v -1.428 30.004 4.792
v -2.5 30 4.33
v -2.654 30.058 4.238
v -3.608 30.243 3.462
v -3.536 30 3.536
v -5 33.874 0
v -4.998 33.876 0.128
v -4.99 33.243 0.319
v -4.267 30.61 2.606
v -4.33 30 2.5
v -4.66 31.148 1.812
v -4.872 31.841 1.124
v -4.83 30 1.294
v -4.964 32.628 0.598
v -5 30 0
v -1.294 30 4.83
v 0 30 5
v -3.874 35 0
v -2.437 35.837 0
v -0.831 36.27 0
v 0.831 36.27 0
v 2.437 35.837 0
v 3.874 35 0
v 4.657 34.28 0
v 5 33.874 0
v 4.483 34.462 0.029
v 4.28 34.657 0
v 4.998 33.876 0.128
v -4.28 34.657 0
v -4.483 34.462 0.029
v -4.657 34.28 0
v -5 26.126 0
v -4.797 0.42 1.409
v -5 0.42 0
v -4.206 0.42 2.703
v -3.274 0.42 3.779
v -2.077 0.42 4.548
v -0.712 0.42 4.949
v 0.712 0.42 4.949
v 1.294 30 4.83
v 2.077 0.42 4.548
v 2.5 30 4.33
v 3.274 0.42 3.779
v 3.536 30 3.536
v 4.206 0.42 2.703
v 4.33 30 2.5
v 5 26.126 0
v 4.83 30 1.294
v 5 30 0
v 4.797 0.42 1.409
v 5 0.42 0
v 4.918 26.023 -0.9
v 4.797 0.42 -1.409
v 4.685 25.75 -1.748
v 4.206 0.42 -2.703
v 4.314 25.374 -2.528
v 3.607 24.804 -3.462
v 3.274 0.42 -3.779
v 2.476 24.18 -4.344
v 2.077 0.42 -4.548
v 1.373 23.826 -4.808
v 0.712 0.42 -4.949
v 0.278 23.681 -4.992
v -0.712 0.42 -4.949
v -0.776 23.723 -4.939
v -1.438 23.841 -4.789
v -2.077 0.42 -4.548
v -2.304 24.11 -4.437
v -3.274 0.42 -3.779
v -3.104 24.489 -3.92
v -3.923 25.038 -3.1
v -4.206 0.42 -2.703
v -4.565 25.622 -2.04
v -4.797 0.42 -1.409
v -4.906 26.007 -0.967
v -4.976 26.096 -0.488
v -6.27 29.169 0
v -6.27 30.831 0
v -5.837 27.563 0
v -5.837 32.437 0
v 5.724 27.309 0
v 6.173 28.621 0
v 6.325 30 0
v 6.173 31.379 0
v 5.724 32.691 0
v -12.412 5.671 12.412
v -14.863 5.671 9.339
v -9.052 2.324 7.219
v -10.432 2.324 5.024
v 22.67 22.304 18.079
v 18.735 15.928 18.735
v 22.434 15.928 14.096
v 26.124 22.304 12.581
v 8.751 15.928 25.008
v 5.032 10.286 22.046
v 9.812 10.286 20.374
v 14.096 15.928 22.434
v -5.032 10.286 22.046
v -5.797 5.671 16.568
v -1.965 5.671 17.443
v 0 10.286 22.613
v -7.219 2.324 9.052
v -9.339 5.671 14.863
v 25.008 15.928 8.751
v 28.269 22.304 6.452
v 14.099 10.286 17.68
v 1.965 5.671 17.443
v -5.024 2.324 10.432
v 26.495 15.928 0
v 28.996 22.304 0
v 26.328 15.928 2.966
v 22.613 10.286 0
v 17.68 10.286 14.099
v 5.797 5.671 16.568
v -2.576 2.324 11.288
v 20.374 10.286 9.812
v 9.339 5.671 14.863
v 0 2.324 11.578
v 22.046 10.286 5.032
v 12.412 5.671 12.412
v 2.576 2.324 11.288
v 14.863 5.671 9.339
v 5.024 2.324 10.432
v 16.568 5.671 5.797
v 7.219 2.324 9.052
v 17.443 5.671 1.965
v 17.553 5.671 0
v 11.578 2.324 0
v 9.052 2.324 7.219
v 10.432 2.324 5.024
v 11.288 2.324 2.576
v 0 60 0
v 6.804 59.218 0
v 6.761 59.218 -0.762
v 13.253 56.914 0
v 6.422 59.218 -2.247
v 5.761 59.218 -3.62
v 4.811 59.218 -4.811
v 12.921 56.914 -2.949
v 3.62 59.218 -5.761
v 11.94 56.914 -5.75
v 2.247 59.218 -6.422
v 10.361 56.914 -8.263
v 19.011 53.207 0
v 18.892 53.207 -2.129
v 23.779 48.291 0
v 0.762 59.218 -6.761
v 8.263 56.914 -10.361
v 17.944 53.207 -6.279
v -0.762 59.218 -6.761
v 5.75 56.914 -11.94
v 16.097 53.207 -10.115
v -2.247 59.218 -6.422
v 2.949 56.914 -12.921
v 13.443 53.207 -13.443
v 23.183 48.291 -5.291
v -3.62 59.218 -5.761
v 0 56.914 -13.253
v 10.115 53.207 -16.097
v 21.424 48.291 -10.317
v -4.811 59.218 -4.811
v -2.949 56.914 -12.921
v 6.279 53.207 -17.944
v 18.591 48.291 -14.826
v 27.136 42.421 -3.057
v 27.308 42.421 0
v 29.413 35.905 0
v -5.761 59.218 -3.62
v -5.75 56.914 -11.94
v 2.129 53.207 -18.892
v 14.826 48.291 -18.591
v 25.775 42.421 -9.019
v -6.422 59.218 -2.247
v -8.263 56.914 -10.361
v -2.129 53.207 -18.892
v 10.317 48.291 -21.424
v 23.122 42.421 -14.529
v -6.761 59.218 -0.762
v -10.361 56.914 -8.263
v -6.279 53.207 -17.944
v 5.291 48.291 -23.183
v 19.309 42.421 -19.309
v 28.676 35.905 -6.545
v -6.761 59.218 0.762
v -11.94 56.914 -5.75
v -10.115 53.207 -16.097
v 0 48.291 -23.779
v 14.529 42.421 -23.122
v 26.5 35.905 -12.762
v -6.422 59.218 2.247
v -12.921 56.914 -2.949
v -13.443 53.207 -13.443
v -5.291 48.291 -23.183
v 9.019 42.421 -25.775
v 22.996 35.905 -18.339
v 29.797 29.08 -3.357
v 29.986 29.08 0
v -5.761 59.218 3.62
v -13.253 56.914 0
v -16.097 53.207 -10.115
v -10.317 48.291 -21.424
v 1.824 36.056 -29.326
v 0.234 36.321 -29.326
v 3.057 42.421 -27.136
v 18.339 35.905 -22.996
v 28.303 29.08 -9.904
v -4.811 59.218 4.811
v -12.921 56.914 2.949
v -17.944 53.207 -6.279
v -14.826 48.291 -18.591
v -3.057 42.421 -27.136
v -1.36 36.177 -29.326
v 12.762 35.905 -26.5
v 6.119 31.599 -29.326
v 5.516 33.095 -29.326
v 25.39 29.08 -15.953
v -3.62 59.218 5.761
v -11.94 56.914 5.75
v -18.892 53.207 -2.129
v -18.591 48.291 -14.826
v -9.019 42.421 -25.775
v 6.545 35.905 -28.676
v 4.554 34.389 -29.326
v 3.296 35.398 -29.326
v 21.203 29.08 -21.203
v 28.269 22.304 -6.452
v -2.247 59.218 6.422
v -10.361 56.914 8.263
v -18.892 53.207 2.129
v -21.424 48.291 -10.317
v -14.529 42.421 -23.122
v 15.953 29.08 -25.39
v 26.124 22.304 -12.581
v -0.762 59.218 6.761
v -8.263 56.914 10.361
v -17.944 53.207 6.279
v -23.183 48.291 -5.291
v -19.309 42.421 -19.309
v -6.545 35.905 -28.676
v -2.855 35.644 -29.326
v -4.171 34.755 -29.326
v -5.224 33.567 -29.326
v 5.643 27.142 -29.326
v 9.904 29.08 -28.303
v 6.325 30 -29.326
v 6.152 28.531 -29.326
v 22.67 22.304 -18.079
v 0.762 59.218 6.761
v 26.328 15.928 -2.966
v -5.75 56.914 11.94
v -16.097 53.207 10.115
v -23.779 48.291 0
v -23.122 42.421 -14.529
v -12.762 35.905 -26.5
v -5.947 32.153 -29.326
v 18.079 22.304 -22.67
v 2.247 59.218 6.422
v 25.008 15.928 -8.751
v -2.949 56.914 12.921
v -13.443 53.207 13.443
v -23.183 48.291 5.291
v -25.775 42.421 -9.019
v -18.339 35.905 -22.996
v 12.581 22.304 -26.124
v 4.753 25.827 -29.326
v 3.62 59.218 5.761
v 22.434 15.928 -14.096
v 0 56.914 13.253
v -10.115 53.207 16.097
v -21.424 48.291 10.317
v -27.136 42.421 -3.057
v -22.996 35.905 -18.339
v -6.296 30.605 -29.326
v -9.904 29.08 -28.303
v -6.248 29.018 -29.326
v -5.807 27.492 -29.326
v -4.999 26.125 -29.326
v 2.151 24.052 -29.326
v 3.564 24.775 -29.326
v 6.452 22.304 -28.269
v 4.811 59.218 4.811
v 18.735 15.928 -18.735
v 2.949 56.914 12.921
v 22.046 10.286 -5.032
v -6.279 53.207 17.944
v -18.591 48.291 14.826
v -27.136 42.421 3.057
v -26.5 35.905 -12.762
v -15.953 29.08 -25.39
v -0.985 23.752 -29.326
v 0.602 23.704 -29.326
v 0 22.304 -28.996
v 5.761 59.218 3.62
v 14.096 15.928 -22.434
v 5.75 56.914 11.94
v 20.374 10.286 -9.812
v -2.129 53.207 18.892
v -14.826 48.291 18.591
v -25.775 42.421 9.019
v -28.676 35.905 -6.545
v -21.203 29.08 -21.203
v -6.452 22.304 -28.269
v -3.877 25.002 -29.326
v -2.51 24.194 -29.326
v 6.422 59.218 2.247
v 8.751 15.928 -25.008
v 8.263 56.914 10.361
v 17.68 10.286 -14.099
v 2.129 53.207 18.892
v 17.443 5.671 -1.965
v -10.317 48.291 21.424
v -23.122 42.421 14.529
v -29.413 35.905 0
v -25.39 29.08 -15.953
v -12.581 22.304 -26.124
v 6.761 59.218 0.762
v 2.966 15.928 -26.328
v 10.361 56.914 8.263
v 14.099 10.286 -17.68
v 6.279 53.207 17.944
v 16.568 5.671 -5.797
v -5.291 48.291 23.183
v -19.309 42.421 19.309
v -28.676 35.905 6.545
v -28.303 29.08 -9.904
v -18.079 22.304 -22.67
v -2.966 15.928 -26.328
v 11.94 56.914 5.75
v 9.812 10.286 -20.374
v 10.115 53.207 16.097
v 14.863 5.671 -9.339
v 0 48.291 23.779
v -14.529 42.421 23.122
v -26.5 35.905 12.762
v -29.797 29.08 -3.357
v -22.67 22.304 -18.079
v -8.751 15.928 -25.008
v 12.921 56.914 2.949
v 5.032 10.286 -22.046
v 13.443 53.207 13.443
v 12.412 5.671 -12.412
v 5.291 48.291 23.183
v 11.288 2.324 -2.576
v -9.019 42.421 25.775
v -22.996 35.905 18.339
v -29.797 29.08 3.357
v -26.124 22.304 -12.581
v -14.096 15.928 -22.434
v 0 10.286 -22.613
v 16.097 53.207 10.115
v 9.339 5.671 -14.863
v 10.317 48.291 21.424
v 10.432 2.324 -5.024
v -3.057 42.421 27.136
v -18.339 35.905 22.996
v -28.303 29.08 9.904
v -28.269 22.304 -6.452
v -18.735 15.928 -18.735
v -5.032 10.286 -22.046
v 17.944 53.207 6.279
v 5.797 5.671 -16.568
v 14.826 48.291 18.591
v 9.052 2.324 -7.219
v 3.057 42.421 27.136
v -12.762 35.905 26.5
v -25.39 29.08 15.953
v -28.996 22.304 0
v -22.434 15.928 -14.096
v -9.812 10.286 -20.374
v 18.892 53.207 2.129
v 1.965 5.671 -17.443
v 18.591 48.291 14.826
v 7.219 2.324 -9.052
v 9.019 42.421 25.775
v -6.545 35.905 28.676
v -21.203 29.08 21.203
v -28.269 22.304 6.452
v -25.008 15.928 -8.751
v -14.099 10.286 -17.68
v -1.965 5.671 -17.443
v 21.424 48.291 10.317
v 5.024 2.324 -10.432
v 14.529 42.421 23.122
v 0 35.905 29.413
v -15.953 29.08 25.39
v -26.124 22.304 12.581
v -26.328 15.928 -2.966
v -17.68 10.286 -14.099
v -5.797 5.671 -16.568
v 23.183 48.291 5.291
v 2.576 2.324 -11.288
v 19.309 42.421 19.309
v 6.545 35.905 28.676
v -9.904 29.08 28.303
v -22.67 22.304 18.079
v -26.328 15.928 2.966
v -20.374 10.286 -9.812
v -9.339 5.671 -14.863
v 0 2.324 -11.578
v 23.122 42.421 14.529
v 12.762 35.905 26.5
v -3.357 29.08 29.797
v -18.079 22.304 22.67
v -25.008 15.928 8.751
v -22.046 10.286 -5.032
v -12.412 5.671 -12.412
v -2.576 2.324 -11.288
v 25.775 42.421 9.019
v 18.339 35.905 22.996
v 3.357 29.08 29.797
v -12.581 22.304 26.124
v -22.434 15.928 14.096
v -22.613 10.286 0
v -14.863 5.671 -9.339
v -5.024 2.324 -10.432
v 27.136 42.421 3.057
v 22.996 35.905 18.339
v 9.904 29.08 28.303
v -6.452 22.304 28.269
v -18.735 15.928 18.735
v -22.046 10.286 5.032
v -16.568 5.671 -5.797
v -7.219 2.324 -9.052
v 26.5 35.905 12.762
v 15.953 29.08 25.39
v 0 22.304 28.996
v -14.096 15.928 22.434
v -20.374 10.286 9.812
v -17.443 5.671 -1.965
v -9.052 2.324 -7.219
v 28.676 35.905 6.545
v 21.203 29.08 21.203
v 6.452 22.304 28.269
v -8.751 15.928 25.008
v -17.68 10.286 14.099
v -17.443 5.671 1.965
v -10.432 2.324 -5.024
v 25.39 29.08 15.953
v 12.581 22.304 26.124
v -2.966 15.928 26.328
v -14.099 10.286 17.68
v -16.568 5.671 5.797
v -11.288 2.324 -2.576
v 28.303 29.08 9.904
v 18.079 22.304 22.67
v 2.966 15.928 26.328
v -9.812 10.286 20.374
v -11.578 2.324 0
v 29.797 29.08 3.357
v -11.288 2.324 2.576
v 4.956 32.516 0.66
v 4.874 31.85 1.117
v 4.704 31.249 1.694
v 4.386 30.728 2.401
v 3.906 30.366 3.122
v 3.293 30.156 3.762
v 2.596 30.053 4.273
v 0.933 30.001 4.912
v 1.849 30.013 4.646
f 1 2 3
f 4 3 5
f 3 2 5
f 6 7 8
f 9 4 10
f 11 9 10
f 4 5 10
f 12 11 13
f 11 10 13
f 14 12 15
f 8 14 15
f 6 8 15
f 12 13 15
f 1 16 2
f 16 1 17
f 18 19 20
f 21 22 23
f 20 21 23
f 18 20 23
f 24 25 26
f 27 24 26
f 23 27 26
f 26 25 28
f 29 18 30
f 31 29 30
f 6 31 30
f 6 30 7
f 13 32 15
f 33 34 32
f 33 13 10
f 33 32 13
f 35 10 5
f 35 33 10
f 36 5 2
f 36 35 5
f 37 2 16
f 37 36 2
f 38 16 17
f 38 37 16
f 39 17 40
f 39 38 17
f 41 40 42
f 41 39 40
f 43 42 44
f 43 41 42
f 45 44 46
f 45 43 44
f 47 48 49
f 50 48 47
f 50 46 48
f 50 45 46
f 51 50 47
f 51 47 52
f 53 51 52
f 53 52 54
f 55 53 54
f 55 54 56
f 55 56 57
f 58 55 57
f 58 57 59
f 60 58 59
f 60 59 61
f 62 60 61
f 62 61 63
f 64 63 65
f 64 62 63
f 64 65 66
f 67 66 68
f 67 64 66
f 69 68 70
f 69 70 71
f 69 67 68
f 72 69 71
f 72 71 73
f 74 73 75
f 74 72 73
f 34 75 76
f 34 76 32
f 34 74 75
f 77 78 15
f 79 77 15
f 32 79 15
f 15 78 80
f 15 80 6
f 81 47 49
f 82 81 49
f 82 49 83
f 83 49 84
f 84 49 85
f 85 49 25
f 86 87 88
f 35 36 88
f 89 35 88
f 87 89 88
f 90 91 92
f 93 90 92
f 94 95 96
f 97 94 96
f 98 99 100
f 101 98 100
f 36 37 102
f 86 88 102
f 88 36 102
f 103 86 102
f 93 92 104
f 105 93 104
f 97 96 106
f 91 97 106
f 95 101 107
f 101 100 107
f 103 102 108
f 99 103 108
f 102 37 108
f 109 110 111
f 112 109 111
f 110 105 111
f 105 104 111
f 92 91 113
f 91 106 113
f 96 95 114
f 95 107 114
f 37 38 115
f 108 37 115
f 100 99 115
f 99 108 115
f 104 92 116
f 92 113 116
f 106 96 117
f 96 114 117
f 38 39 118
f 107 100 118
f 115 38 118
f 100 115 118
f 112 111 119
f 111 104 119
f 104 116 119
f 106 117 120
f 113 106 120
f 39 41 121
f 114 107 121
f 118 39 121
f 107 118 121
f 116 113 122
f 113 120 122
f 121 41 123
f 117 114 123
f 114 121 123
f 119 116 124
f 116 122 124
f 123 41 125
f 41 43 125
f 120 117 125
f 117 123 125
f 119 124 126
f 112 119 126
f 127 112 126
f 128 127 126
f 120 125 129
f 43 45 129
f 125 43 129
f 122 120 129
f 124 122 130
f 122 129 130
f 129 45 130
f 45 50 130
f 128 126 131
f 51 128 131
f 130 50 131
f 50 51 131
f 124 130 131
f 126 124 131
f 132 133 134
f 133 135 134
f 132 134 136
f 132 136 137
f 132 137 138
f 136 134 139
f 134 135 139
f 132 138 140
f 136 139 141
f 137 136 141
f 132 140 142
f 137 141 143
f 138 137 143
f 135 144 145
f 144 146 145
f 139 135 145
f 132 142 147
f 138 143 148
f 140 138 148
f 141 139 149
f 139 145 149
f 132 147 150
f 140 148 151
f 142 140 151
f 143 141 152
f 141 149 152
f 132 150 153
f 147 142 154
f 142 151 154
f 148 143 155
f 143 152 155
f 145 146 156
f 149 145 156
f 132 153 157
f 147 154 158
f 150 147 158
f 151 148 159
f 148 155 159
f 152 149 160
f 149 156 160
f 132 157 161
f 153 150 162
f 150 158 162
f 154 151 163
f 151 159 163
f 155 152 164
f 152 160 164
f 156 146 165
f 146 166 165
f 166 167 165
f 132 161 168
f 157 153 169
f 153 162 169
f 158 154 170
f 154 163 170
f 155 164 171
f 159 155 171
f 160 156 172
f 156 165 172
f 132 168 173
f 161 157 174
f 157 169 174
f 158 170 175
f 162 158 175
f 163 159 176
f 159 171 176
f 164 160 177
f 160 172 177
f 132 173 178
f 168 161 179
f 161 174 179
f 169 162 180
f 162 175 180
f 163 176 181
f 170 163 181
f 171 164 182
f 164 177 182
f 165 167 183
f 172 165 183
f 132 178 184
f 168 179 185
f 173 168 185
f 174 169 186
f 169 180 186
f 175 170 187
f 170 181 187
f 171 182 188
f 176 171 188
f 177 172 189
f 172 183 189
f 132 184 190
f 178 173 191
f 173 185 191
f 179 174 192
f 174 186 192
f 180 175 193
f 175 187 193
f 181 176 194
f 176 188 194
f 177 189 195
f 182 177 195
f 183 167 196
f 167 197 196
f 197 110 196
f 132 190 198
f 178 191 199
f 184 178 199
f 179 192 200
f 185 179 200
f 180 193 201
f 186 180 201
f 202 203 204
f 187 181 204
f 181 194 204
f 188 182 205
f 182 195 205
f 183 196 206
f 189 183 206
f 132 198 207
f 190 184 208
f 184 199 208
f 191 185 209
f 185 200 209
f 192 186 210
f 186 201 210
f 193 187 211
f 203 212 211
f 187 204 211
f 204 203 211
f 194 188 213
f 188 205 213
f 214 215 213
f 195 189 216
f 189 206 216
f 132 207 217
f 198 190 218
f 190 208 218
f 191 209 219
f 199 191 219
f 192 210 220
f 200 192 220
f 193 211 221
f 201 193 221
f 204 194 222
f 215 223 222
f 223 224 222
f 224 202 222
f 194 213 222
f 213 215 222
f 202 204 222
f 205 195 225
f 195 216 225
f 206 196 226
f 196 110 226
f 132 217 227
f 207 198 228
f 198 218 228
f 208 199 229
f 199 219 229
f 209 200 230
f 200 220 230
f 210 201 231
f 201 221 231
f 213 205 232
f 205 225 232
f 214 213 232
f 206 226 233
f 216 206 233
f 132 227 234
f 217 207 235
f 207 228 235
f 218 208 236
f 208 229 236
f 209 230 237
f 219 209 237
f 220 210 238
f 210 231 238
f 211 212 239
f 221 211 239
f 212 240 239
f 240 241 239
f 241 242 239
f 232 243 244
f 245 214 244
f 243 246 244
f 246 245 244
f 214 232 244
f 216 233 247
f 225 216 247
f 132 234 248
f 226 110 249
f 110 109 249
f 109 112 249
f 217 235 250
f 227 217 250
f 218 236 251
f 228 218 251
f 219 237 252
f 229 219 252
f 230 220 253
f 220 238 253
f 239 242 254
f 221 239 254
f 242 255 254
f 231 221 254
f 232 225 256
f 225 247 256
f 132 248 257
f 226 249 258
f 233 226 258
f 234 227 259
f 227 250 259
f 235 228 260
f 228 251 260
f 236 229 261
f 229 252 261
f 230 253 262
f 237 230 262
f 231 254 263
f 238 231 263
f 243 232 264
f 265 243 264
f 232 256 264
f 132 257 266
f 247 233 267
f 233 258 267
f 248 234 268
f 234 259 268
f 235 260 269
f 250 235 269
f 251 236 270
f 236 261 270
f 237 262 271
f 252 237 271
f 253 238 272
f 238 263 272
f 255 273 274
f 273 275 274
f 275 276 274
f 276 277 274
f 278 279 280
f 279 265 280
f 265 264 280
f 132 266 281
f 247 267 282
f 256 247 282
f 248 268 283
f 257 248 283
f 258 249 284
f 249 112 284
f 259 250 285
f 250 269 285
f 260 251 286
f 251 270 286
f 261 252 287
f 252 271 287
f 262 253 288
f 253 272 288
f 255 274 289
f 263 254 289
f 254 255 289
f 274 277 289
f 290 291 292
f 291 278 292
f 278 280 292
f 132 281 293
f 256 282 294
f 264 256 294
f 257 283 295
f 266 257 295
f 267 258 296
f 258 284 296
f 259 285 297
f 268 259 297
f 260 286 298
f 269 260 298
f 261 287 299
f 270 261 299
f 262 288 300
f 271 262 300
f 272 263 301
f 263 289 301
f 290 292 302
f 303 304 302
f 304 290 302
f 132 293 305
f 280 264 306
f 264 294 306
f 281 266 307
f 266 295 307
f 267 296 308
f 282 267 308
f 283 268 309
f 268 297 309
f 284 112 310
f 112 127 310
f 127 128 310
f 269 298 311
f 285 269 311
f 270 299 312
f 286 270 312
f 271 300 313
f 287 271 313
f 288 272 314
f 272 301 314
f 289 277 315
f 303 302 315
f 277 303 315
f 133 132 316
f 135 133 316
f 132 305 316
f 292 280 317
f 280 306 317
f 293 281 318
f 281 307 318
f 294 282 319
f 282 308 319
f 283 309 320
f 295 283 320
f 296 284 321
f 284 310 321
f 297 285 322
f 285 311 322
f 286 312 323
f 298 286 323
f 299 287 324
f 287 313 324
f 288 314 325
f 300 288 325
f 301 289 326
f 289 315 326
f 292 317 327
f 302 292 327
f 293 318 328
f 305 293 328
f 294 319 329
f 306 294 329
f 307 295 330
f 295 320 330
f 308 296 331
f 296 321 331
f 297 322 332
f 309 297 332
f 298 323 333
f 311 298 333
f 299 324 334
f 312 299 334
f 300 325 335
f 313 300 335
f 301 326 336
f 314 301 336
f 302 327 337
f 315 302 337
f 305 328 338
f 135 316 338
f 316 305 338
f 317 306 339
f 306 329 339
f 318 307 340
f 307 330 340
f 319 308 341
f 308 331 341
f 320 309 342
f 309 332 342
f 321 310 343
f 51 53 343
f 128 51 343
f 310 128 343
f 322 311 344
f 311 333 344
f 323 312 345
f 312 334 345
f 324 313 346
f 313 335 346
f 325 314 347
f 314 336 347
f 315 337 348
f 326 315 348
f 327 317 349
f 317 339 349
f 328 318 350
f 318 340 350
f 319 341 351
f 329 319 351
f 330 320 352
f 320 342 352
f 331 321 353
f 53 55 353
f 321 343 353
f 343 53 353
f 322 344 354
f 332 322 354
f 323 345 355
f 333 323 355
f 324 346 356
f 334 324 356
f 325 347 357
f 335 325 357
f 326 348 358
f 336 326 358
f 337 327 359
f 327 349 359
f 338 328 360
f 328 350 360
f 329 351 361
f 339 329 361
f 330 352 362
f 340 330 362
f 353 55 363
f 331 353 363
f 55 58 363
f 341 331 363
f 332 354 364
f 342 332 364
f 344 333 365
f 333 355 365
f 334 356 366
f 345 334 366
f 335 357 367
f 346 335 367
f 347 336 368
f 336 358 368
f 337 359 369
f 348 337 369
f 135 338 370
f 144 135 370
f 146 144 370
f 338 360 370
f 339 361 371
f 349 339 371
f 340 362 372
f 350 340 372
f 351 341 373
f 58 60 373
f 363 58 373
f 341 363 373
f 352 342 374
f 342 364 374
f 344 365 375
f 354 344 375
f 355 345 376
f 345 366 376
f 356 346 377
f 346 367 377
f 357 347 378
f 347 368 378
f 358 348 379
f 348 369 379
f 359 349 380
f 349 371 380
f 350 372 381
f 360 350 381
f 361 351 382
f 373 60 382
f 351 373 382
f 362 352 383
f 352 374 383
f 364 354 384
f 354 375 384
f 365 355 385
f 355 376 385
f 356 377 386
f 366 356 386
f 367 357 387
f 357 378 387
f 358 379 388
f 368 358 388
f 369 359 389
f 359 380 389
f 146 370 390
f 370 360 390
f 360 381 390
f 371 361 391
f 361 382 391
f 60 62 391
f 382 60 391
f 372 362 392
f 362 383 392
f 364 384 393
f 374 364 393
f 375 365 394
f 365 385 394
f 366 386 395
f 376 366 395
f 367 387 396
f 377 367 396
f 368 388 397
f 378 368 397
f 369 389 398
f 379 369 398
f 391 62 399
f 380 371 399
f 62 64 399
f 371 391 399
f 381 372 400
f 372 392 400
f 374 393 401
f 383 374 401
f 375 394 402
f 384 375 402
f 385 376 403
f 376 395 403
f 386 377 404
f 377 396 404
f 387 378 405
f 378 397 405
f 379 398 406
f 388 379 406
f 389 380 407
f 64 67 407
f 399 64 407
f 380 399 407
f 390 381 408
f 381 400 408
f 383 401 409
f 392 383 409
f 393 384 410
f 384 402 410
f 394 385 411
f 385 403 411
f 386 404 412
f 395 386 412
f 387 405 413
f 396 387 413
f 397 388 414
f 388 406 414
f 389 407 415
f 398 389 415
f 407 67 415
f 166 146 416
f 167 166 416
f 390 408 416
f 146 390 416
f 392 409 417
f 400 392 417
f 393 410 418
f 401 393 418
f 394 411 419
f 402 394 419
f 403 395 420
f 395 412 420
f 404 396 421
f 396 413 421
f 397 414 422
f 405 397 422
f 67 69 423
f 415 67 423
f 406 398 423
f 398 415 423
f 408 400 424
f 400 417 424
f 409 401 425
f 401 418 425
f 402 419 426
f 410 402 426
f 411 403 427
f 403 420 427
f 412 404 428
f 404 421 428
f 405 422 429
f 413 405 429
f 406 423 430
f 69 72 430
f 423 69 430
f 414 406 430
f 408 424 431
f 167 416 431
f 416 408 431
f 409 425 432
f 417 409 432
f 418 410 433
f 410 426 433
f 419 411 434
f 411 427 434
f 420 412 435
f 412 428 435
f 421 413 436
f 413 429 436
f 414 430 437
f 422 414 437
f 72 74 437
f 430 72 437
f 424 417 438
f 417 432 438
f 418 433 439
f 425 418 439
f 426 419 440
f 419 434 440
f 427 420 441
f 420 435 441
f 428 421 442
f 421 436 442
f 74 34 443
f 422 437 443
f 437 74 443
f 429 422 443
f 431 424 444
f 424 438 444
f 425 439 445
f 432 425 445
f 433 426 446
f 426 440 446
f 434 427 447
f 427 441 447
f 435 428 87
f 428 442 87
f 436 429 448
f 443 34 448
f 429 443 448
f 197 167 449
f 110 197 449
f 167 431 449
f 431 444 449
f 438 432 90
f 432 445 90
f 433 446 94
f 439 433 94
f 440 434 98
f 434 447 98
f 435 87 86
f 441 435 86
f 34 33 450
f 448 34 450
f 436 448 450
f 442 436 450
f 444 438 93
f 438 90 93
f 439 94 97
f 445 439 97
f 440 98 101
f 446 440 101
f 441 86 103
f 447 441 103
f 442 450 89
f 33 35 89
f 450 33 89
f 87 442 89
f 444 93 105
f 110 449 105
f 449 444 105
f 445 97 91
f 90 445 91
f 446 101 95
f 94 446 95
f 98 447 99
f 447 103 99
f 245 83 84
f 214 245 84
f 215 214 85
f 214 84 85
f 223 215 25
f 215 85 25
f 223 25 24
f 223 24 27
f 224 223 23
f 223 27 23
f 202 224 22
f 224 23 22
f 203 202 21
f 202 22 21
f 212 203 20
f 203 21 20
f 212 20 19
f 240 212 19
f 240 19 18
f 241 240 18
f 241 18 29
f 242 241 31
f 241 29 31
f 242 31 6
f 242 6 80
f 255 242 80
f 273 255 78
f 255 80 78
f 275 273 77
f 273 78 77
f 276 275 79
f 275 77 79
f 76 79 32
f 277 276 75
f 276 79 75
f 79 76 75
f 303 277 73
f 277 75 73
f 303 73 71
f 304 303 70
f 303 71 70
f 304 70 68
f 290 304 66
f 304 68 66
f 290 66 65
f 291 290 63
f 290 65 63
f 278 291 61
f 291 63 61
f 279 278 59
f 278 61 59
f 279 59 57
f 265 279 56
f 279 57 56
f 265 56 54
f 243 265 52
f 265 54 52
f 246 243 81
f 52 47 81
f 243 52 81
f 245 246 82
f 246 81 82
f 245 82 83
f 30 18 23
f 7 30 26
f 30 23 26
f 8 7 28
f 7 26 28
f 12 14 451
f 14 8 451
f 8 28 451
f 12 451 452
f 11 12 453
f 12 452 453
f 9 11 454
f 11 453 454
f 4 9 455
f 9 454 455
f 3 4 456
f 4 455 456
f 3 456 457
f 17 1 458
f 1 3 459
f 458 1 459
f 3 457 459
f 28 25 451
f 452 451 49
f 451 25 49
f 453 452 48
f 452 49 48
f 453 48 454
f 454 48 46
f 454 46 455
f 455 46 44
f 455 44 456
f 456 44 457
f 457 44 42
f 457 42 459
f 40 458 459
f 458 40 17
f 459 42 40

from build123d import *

# Parameters (mm, degrees)
SKETCH2_R          = 6.325
CUT_EXTRUDE1_DEPTH = 35
SKETCH3_R          = 5
CUT_EXTRUDE2_DEPTH = 30
FILLET1_R          = 5


with BuildPart() as part:
    # Sketch1 → Revolve1 (revolve)
    with BuildSketch(Plane.XY):
        with BuildLine():
            Line((0, 0), (0, 60))
            ThreePointArc((0, 60), (30, 30), (0, 0))
        make_face()
    revolve(axis=Axis((0, 0, 0), (0, 1, 0)))

    # Sketch2 → Cut-Extrude1 (cut)
    with BuildSketch(Plane.XY):
        with Locations((0, 30)):
            Circle(SKETCH2_R)
    extrude(amount=-CUT_EXTRUDE1_DEPTH, mode=Mode.SUBTRACT)

    # Sketch3 → Cut-Extrude2 (cut)
    with BuildSketch(Plane(origin=(0, 0, 0), x_dir=(1, 0, 0), z_dir=(0, 1, 0))):
        with Locations(Location((0, 0, 0), (0, 0, 180))):
            Circle(SKETCH3_R)
    extrude(amount=CUT_EXTRUDE2_DEPTH, mode=Mode.SUBTRACT)

    # Fillet1
    # the kernel refuses this fillet: 5 mm, written as the material it takes off along each edge
    with BuildSketch(Plane(origin=(17.5, 30, 0), x_dir=(0, 1, 0), z_dir=(-1, 0, 0))) as fillet1_piece_1_section:
        with BuildLine():
            CenterArc((FILLET1_R, -FILLET1_R), FILLET1_R, 90, 90)
            Line((0, -FILLET1_R), (0, 0))
            Line((0, 0), (FILLET1_R, 0))
        make_face()
    fillet1_piece_1 = extrude(amount=35, mode=Mode.PRIVATE)
    fillet1_piece_1 = fillet1_piece_1 & Plane(origin=(0, 31.17476679, 0), x_dir=(-1, 0, 0), z_dir=(0, -1, 0)) * Cylinder(5, 90, mode=Mode.PRIVATE)
    fillet1_piece_1 = fillet1_piece_1 & Plane(origin=(0, 30, 1.028849853), x_dir=(1, 0, 0), z_dir=(0, 0, 1)) * Cylinder(6.325, 90, mode=Mode.PRIVATE)
    add(fillet1_piece_1, mode=Mode.SUBTRACT)


solid = part.part
